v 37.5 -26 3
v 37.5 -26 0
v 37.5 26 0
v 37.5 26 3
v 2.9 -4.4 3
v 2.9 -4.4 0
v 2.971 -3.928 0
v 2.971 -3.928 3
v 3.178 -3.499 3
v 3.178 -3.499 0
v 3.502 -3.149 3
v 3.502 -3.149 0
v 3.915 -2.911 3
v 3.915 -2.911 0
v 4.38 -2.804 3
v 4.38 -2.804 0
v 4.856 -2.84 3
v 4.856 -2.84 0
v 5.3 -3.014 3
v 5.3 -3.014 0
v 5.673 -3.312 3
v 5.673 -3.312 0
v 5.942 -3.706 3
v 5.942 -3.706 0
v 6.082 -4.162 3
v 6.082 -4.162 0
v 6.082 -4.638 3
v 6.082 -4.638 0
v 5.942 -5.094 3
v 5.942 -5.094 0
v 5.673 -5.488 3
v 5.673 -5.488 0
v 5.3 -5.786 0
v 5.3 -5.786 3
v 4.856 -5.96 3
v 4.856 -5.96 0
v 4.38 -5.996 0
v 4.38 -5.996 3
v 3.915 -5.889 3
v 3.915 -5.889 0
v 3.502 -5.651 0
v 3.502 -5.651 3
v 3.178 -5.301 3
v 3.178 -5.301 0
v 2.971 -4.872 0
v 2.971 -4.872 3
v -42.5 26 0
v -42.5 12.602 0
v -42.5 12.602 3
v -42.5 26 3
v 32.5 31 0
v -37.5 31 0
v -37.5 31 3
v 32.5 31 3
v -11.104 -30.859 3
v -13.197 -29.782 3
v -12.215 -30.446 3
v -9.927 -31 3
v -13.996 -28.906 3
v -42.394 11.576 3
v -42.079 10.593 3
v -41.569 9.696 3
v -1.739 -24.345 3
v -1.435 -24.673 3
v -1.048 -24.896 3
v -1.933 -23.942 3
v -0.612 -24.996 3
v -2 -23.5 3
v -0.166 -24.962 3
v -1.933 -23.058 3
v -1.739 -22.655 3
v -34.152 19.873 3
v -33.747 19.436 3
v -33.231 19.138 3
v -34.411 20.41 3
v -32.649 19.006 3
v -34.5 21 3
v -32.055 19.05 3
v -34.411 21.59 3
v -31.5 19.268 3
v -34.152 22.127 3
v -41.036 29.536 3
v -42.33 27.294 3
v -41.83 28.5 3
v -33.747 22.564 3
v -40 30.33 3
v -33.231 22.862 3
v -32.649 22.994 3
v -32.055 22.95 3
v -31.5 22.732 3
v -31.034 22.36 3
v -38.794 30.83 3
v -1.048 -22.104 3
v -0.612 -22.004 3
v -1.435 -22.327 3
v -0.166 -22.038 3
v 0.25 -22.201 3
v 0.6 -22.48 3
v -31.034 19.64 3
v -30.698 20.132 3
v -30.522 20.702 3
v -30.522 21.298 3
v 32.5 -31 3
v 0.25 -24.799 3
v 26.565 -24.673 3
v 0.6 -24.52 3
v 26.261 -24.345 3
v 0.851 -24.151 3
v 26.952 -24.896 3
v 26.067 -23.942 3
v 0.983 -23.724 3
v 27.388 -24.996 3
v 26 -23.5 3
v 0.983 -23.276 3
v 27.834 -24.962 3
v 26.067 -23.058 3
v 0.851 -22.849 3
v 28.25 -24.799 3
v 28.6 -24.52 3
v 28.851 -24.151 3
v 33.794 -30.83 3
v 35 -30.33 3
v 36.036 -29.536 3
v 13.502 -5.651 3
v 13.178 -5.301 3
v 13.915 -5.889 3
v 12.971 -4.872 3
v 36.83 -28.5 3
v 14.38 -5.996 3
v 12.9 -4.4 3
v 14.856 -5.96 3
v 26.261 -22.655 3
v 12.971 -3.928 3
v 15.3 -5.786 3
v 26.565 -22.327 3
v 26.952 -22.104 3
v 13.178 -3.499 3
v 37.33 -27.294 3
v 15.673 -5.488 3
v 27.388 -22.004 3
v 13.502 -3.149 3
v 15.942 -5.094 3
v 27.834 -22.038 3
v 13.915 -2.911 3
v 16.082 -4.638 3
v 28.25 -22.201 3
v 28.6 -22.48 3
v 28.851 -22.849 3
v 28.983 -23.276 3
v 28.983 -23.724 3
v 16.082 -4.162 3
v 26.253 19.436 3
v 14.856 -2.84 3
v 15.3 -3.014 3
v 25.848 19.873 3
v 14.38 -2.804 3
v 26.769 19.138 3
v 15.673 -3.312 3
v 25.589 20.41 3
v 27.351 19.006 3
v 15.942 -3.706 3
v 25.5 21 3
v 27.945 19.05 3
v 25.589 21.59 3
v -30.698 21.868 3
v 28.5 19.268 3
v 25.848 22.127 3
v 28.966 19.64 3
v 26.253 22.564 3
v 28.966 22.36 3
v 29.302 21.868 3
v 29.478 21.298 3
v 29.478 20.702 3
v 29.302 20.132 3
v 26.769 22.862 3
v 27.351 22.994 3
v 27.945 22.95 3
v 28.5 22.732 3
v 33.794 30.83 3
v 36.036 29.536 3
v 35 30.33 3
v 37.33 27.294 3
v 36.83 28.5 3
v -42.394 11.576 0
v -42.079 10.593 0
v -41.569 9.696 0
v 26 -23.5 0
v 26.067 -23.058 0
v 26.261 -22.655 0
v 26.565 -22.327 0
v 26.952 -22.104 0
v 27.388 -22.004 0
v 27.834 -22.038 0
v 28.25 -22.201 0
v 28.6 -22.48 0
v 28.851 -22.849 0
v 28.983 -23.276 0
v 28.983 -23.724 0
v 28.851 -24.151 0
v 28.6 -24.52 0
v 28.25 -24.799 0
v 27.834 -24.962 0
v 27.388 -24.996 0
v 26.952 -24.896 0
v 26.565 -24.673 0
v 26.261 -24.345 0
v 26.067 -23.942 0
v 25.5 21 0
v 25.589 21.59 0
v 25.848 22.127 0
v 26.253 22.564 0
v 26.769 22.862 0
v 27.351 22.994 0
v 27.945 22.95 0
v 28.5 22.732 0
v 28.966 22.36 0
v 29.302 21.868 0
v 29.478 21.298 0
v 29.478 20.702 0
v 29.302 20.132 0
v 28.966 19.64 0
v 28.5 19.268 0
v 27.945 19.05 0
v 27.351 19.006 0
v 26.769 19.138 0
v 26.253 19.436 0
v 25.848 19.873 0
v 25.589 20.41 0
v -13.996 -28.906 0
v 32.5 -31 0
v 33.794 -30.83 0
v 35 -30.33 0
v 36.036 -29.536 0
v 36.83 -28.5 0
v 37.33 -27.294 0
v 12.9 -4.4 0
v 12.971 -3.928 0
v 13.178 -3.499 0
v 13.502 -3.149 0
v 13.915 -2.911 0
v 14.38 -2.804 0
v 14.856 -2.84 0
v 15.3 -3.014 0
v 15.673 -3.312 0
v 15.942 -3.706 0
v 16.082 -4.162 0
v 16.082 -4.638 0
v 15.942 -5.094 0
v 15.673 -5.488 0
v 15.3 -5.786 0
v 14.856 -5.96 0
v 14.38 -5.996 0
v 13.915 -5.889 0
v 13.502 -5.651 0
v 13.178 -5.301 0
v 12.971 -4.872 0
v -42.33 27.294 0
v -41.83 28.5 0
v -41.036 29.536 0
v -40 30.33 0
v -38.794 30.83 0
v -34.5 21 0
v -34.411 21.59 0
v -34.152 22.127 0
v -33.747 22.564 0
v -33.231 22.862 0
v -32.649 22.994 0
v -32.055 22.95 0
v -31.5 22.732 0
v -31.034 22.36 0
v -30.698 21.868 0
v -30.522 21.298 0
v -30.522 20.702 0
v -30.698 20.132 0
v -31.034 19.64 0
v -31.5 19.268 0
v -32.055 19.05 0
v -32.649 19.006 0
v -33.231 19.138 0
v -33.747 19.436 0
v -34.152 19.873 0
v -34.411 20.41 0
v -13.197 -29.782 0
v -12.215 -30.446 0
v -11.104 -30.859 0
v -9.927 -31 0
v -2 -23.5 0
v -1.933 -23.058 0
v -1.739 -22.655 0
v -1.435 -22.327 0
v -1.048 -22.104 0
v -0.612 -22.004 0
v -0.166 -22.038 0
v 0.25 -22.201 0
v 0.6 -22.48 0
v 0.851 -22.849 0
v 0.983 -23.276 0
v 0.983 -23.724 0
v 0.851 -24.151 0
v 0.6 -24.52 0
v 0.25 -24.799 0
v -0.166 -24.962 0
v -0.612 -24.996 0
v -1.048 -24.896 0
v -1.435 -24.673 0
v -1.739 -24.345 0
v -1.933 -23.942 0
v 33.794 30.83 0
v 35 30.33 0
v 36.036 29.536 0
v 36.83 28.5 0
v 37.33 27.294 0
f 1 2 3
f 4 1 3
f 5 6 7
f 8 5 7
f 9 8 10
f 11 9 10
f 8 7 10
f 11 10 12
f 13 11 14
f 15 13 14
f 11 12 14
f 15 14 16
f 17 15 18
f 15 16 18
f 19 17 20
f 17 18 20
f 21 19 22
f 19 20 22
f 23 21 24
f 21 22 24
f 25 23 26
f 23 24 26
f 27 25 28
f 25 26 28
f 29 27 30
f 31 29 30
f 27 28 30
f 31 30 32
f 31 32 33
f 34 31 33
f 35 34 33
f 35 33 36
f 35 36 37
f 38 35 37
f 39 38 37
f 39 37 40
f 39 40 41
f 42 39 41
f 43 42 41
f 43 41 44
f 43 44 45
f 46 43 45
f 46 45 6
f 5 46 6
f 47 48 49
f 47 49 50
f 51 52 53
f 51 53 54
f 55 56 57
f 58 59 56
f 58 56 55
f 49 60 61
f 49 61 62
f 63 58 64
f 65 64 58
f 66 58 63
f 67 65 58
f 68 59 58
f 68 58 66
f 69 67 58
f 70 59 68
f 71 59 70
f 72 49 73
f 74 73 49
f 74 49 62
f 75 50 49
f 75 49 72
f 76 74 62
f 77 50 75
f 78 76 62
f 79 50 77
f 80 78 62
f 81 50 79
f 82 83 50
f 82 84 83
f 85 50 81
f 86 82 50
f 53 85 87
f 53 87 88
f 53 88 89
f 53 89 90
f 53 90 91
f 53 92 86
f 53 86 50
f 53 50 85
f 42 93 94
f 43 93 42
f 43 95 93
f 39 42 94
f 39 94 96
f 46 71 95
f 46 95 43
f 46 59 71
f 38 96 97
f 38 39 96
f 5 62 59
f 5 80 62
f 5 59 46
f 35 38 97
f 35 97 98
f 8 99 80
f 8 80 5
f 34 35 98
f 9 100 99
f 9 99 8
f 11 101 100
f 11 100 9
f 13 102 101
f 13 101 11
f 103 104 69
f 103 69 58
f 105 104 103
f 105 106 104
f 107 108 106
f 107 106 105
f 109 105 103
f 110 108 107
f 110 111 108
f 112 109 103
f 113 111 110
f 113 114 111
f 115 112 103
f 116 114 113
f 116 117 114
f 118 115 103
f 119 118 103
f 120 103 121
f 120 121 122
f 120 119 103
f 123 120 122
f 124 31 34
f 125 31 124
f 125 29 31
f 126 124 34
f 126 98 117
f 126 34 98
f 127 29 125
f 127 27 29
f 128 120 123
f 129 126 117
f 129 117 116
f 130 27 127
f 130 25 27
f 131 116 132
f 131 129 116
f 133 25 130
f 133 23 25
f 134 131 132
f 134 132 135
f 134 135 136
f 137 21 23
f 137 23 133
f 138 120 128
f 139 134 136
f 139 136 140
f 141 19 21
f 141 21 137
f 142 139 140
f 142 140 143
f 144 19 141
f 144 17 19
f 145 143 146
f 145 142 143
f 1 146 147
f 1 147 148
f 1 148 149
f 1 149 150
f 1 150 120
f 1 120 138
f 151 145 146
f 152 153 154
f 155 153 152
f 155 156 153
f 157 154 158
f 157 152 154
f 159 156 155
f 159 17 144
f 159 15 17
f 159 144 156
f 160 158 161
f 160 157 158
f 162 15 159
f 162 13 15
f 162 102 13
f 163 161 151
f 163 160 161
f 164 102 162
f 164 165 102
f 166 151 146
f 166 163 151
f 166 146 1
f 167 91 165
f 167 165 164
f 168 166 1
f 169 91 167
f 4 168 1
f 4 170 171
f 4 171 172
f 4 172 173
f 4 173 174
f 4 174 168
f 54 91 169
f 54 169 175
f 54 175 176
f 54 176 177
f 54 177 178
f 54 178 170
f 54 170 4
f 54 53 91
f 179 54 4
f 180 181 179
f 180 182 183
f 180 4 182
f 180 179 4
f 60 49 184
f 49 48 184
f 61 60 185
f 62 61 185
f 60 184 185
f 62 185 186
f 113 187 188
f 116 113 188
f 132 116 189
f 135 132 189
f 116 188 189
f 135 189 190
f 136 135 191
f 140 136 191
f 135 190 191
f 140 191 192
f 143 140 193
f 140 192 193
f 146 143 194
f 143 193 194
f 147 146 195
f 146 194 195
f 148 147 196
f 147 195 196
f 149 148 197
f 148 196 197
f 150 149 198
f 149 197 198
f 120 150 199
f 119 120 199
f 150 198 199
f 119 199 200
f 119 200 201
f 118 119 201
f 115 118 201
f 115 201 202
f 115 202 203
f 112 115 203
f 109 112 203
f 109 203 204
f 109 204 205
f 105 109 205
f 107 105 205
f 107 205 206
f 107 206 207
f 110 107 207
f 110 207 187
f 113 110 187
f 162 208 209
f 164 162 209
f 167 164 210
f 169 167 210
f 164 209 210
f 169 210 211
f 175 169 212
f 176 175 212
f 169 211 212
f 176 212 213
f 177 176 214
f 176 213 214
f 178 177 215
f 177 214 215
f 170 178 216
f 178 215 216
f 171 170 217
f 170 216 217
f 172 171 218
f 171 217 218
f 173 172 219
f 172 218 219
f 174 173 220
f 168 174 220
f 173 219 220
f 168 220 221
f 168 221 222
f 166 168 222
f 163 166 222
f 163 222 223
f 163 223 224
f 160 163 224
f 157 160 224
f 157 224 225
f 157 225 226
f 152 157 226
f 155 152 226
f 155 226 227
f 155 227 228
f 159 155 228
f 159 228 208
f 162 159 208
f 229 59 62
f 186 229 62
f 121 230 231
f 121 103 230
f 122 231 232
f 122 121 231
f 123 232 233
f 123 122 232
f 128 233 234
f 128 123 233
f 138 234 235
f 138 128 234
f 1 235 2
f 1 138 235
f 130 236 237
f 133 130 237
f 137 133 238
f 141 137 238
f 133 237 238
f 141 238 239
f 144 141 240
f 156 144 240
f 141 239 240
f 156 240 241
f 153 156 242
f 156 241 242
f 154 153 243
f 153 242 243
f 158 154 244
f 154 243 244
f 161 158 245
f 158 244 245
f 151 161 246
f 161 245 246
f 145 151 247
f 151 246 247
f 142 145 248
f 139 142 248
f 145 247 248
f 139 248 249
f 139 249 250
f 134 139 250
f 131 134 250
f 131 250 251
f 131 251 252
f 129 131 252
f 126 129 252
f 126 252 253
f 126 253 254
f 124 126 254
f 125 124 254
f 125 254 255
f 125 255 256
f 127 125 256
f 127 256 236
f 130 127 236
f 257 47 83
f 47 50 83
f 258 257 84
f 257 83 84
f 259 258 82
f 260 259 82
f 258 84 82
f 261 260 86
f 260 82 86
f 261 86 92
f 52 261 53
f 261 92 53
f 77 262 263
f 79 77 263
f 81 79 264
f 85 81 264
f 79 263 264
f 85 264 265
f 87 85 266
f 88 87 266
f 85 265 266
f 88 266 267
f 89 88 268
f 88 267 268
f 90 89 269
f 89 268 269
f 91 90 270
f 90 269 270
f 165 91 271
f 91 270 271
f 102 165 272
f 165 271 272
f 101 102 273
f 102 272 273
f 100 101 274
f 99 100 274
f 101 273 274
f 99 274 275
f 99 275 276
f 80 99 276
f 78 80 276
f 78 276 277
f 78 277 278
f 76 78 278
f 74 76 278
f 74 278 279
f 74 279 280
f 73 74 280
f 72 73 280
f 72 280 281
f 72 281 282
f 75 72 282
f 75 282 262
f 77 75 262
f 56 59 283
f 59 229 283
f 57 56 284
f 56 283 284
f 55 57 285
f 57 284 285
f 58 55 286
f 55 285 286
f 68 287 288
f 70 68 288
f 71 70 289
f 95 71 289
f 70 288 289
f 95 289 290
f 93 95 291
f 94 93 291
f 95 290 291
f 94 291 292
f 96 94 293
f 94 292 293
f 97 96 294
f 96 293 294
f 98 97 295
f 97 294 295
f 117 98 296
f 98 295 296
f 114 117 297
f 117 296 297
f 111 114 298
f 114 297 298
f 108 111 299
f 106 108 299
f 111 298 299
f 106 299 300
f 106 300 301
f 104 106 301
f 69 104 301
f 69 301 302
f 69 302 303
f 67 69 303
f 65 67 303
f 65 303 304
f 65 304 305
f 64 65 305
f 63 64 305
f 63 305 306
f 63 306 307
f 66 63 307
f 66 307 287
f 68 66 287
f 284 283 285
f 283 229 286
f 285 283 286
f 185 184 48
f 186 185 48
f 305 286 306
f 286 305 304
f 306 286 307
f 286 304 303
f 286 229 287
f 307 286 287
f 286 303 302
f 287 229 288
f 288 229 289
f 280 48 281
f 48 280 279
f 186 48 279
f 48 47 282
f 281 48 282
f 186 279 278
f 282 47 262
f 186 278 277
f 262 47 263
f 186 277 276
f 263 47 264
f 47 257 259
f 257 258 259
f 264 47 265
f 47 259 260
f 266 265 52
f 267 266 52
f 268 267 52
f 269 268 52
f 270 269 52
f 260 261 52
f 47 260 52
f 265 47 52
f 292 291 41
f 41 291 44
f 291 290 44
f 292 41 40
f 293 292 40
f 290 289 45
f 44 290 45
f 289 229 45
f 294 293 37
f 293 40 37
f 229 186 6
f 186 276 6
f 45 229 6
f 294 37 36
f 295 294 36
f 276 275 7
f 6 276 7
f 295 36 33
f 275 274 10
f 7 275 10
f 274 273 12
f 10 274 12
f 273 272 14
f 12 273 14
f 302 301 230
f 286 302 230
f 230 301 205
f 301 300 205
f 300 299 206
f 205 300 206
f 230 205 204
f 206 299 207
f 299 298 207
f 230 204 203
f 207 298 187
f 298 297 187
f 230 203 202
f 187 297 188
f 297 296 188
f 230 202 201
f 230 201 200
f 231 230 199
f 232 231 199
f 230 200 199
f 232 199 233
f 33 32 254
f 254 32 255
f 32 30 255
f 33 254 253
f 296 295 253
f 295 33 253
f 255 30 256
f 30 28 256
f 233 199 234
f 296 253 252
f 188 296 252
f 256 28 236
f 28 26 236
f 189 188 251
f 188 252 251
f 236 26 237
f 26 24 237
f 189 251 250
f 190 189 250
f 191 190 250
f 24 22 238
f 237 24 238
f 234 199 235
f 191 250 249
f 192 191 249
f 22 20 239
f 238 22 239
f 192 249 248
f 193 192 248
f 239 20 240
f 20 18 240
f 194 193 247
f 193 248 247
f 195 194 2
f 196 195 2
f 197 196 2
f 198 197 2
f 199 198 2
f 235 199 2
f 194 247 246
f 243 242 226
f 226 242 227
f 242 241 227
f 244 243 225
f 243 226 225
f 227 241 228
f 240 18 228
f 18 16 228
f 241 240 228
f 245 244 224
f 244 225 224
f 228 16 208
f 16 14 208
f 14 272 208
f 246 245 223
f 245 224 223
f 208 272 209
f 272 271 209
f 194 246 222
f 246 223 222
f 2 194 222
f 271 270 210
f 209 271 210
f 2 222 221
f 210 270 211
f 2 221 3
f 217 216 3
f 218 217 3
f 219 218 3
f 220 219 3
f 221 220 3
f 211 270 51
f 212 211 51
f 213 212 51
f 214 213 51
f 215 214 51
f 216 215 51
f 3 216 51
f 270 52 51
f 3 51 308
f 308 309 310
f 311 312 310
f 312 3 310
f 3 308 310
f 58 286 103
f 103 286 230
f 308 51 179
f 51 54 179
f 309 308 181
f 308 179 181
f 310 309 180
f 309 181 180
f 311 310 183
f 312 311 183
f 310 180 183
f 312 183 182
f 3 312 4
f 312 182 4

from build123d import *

# Parameters (mm, degrees)
SKETCH_1_W              = 80
SKETCH_1_H              = 62
EXTRUDE_1_DEPTH         = 3
HOLE_WIZARD_4_0_4_1_D   = 4
HOLE_WIZARD_3_2_3_2_1_D = 3.2
CUT_EXTRUDE_1_DEPTH     = 3
HOLE_WIZARD_3_0_3_1_D   = 3
FILLET_1_R              = 5


with BuildPart() as part:
    # 草图1 → 凸台-拉伸1 (new body)
    with BuildSketch(Plane.XY):
        with Locations((-2.5, 0)):
            Rectangle(SKETCH_1_W, SKETCH_1_H)
    extrude(amount=EXTRUDE_1_DEPTH)

    # Ø4.0 (4) 直径孔1 (through all)
    with Locations(Plane.XY.offset(3)):
        with Locations((27.5, 21), (-32.5, 21)):
            Hole(HOLE_WIZARD_4_0_4_1_D / 2)

    # Ø3.2 (3.2) 直径孔1 (through all)
    with Locations(Plane.XY.offset(3)):
        with Locations((14.5, -4.4), (4.5, -4.4)):
            Hole(HOLE_WIZARD_3_2_3_2_1_D / 2)

    # 草图6 → 切除-拉伸1 (cut)
    with BuildSketch(Plane.XY.offset(3)):
        Polygon((-42.5, 11), (-42.5, -31), (-12.5, -31), align=None)
    extrude(amount=-CUT_EXTRUDE_1_DEPTH, mode=Mode.SUBTRACT)

    # Ø3.0 (3) 直径孔1 (through all)
    with Locations(Plane.XY.offset(3)):
        with Locations((27.5, -23.5), (-0.5, -23.5)):
            Hole(HOLE_WIZARD_3_0_3_1_D / 2)

    # 圆角1
    fillet_1_edges = [part.edges().sort_by_distance(p)[0] for p in [
        (-42.5, 11, 1.5),
        (-12.5, -31, 1.5),
        (37.5, -31, 1.5),
        (-42.5, 31, 1.5),
        (37.5, 31, 1.5),
    ]]
    fillet(fillet_1_edges, radius=FILLET_1_R)


solid = part.part
